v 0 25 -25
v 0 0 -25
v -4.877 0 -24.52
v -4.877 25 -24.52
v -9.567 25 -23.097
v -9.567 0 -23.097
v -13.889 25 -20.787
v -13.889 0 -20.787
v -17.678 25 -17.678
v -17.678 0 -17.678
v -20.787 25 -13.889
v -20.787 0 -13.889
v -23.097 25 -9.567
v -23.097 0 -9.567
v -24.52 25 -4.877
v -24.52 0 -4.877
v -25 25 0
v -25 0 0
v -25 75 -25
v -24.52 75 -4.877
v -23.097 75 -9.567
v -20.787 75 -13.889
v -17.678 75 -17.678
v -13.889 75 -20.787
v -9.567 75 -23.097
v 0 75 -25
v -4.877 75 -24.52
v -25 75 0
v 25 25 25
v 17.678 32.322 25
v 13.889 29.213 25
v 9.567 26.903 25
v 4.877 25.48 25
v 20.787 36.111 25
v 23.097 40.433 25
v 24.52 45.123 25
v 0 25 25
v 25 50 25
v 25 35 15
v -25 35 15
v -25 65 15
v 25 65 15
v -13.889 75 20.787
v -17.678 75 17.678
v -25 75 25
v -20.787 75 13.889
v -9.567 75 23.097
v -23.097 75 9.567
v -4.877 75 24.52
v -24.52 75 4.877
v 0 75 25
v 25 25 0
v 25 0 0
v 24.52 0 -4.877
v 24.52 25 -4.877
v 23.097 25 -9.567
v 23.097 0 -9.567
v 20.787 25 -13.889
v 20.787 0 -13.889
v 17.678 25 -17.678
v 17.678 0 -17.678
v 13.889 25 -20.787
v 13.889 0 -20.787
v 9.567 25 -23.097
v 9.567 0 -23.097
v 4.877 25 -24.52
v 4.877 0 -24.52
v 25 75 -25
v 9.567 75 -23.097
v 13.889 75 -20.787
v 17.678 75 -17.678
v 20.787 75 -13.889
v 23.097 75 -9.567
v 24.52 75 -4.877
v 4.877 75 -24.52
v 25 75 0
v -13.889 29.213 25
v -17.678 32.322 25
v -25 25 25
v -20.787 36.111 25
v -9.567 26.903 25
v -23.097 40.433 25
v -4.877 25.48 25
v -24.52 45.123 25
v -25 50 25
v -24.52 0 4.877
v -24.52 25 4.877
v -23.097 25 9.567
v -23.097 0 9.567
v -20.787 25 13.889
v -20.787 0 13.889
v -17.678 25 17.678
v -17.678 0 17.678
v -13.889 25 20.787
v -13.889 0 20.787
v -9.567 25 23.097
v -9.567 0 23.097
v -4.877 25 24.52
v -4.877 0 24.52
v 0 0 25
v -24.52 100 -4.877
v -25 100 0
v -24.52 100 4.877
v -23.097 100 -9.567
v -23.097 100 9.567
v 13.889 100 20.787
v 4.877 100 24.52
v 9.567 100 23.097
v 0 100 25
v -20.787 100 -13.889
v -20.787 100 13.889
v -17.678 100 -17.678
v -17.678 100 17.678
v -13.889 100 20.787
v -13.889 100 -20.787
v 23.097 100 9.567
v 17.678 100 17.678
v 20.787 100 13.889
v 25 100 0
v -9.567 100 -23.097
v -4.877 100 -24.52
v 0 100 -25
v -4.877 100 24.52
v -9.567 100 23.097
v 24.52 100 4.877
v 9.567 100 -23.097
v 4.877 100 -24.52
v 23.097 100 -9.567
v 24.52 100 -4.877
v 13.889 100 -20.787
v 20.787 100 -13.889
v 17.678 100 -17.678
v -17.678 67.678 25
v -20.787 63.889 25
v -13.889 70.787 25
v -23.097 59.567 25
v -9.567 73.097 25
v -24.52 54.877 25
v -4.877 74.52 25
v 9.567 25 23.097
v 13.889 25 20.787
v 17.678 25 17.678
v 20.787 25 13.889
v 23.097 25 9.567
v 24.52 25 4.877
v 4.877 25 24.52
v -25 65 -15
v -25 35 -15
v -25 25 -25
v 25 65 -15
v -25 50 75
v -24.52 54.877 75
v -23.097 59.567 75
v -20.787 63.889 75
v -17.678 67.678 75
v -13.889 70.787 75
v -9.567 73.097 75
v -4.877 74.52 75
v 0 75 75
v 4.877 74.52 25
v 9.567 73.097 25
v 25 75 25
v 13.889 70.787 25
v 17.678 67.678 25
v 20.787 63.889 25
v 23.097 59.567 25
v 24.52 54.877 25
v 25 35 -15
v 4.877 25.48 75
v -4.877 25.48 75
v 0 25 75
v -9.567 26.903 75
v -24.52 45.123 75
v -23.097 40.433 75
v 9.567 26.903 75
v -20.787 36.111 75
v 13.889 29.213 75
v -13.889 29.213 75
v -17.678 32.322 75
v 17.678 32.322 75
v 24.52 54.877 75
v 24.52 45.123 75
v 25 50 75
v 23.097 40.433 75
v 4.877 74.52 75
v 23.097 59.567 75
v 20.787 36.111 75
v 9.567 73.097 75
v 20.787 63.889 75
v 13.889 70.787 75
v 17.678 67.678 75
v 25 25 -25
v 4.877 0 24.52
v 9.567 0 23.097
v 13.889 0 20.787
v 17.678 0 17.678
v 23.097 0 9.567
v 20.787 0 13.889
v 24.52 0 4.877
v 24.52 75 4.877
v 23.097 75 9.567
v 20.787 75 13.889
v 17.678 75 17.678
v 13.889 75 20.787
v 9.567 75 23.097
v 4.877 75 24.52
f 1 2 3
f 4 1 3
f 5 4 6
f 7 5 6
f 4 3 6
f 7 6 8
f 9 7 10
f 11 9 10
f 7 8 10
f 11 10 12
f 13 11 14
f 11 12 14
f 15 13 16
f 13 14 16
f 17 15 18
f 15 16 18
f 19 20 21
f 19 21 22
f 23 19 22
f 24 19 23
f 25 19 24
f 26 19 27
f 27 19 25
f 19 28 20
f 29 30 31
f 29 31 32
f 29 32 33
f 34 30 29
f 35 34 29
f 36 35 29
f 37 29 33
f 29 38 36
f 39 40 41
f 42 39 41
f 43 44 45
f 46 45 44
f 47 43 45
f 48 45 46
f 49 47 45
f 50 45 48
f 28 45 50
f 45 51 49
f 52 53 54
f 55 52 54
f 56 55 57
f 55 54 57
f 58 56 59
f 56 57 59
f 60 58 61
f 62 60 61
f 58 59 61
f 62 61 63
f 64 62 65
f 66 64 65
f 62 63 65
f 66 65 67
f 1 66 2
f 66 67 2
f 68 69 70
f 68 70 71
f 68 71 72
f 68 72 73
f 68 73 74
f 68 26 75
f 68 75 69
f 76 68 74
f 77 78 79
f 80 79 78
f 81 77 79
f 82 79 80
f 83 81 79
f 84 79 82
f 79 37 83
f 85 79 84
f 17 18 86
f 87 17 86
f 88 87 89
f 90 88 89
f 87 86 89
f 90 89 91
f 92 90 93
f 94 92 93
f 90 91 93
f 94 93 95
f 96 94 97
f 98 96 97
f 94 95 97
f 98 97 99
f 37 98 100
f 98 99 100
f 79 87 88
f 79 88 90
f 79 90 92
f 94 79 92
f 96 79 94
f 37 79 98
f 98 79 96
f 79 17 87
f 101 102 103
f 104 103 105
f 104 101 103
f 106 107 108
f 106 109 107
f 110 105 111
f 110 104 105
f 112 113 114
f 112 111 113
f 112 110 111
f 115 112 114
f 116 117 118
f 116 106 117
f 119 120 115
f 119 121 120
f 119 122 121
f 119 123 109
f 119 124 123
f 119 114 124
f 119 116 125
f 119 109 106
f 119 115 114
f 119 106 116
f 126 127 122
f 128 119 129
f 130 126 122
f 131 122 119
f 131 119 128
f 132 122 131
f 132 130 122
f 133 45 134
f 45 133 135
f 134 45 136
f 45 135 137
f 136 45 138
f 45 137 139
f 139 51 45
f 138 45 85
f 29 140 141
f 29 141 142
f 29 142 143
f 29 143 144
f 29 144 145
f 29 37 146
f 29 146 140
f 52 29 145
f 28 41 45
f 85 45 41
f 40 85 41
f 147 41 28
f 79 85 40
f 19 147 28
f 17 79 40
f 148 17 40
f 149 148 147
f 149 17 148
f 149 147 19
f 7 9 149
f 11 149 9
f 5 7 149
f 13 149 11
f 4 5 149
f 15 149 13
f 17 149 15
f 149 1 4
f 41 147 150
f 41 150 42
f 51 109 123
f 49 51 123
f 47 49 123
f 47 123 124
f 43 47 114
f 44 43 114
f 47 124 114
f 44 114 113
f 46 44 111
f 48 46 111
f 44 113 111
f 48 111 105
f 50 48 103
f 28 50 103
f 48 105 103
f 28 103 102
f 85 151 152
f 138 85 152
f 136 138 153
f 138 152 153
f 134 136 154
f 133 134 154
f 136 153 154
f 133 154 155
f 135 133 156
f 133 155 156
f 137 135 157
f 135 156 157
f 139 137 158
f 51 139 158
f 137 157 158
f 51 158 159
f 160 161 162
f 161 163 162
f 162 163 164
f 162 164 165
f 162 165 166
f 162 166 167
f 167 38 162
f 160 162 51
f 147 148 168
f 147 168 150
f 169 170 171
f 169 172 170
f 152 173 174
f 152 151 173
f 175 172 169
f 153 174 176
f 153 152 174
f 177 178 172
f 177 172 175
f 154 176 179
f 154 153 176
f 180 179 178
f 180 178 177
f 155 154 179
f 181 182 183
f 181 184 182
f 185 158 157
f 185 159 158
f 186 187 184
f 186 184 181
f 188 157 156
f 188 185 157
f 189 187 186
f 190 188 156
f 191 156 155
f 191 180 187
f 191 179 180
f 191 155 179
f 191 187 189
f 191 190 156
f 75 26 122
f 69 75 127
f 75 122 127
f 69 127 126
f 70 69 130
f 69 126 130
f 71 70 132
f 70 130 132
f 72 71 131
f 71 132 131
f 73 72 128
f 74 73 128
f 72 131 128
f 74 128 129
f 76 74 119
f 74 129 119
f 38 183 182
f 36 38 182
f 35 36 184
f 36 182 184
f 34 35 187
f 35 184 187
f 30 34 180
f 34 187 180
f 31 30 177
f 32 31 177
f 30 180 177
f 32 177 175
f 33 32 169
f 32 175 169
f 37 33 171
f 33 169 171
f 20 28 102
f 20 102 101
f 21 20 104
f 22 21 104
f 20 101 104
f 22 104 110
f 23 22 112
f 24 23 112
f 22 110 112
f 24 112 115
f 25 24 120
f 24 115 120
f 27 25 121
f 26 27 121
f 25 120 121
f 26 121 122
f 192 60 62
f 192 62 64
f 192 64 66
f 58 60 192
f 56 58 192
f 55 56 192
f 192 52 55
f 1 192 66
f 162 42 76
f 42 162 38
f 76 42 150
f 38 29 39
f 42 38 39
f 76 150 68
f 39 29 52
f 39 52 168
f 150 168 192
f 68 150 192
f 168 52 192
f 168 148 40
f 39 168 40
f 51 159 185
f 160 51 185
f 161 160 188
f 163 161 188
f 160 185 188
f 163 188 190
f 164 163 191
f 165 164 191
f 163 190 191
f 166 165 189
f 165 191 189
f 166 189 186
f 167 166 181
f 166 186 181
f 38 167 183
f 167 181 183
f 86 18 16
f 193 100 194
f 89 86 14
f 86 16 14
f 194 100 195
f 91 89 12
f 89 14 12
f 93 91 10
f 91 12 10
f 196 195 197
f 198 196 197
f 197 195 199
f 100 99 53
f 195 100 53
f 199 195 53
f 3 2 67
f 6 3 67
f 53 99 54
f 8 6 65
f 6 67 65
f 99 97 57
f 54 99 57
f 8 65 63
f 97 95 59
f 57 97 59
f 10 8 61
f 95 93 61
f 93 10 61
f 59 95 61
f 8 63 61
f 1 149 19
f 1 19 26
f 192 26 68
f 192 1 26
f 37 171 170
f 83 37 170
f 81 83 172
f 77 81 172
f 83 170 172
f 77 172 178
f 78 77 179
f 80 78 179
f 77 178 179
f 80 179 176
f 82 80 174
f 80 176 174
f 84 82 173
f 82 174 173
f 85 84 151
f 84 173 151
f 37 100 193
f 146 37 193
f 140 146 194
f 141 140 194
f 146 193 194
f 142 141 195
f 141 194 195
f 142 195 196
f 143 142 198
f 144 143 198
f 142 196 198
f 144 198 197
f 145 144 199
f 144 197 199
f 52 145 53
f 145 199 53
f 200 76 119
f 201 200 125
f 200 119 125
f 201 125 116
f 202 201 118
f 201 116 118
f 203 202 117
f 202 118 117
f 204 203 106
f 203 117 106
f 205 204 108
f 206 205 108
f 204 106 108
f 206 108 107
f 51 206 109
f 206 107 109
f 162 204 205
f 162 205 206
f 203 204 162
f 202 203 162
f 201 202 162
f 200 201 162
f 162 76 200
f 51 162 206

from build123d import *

# Parameters (mm, degrees)
SKETCH1_W           = 50
SKETCH1_H           = 50
BOSS_EXTRUDE1_DEPTH = 100
SKETCH2_W           = 50
SKETCH2_H           = 50
BOSS_EXTRUDE2_DEPTH = 50
CUT_EXTRUDE1_DEPTH  = 50
CUT_EXTRUDE3_DEPTH  = 25
CUT_EXTRUDE4_DEPTH  = 25
CUT_EXTRUDE5_REACH  = 52
SKETCH6_W           = 30
SKETCH6_H           = 30


with BuildPart() as part:
    # Sketch1 → Boss-Extrude1 (new body)
    with BuildSketch(Plane(origin=(0, 0, 0), x_dir=(1, 0, 0), z_dir=(0, 1, 0))):
        Rectangle(SKETCH1_W, SKETCH1_H)
    extrude(amount=BOSS_EXTRUDE1_DEPTH)

    # Sketch2 → Boss-Extrude2 (add)
    with BuildSketch(Plane.XY.offset(25)):
        with Locations((0, 50)):
            Rectangle(SKETCH2_W, SKETCH2_H)
    extrude(amount=BOSS_EXTRUDE2_DEPTH)

    # Sketch3 → Cut-Extrude1 (cut)
    with BuildSketch(Plane.XY.offset(75)):
        with BuildLine():
            Line((8.4e-08, 75), (-25, 75))
            Line((-25, 75), (-25, 49.999999966))
            ThreePointArc((-25, 49.999999966), (-17.677669512, 67.677669547), (8.4e-08, 75))
        make_face()
        with BuildLine():
            Line((25, 75), (8.4e-08, 75))
            ThreePointArc((8.4e-08, 75), (17.677669559, 67.6776695), (25, 50))
            Line((25, 50), (25, 75))
        make_face()
        with BuildLine():
            Line((25, 25), (25, 50))
            ThreePointArc((25, 50), (17.677669509, 32.32233045), (-5.8e-08, 25))
            Line((-5.8e-08, 25), (25, 25))
        make_face()
        with BuildLine():
            ThreePointArc((-5.8e-08, 25), (-17.677669538, 32.322330479), (-25, 49.999999966))
            Line((-25, 49.999999966), (-25, 25))
            Line((-25, 25), (-5.8e-08, 25))
        make_face()
    extrude(amount=-CUT_EXTRUDE1_DEPTH, mode=Mode.SUBTRACT)

    # Sketch4 → Cut-Extrude3 (cut)
    with BuildSketch(Plane(origin=(0, 100, 0), x_dir=(1, 0, 0), z_dir=(0, 1, 0))):
        with BuildLine():
            ThreePointArc((0, -25), (-17.67766954, -17.677669519), (-25, 3e-08))
            Line((-25, 3e-08), (-25, -25))
            Line((-25, -25), (0, -25))
        make_face()
        with BuildLine():
            Line((0, 25), (-25, 25))
            Line((-25, 25), (-25, 3e-08))
            ThreePointArc((-25, 3e-08), (-17.677669519, 17.67766954), (0, 25))
        make_face()
        with BuildLine():
            Line((25, 25), (0, 25))
            ThreePointArc((0, 25), (17.67766953, 17.67766953), (25, 0))
            Line((25, 0), (25, 25))
        make_face()
        with BuildLine():
            Line((25, -25), (25, 0))
            ThreePointArc((25, 0), (17.67766953, -17.67766953), (0, -25))
            Line((0, -25), (25, -25))
        make_face()
    extrude(amount=-CUT_EXTRUDE3_DEPTH, mode=Mode.SUBTRACT)

    # Sketch5 → Cut-Extrude4 (cut)
    with BuildSketch(Plane.XZ):
        with BuildLine():
            Line((-2e-08, 25), (-25, 25))
            Line((-25, 25), (-25, 1e-09))
            ThreePointArc((-25, 1e-09), (-17.677669536, 17.677669523), (-2e-08, 25))
        make_face()
        with BuildLine():
            Line((25, 25), (-2e-08, 25))
            ThreePointArc((-2e-08, 25), (17.677669523, 17.677669537), (25, 0))
            Line((25, 0), (25, 25))
        make_face()
        with BuildLine():
            Line((25, -25), (25, 0))
            ThreePointArc((25, 0), (17.67766952, -17.677669539), (-2.6e-08, -25))
            Line((-2.6e-08, -25), (25, -25))
        make_face()
        with BuildLine():
            ThreePointArc((-2.6e-08, -25), (-17.677669539, -17.67766952), (-25, 1e-09))
            Line((-25, 1e-09), (-25, -25))
            Line((-25, -25), (-2.6e-08, -25))
        make_face()
    extrude(amount=-CUT_EXTRUDE4_DEPTH, mode=Mode.SUBTRACT)

    # Sketch6 → Cut-Extrude5 (cut, up to next)
    with BuildSketch(Plane.ZY.offset(25), mode=Mode.PRIVATE) as cut_extrude5_sk1:
        with Locations((0, 50)):
            Rectangle(SKETCH6_W, SKETCH6_H)
    cut_extrude5_tool1 = extrude(cut_extrude5_sk1.sketch, amount=-CUT_EXTRUDE5_REACH, mode=Mode.PRIVATE) & part.part
    add(cut_extrude5_tool1.solids().sort_by_distance((-25, 50, 0))[0], mode=Mode.SUBTRACT)


solid = part.part
